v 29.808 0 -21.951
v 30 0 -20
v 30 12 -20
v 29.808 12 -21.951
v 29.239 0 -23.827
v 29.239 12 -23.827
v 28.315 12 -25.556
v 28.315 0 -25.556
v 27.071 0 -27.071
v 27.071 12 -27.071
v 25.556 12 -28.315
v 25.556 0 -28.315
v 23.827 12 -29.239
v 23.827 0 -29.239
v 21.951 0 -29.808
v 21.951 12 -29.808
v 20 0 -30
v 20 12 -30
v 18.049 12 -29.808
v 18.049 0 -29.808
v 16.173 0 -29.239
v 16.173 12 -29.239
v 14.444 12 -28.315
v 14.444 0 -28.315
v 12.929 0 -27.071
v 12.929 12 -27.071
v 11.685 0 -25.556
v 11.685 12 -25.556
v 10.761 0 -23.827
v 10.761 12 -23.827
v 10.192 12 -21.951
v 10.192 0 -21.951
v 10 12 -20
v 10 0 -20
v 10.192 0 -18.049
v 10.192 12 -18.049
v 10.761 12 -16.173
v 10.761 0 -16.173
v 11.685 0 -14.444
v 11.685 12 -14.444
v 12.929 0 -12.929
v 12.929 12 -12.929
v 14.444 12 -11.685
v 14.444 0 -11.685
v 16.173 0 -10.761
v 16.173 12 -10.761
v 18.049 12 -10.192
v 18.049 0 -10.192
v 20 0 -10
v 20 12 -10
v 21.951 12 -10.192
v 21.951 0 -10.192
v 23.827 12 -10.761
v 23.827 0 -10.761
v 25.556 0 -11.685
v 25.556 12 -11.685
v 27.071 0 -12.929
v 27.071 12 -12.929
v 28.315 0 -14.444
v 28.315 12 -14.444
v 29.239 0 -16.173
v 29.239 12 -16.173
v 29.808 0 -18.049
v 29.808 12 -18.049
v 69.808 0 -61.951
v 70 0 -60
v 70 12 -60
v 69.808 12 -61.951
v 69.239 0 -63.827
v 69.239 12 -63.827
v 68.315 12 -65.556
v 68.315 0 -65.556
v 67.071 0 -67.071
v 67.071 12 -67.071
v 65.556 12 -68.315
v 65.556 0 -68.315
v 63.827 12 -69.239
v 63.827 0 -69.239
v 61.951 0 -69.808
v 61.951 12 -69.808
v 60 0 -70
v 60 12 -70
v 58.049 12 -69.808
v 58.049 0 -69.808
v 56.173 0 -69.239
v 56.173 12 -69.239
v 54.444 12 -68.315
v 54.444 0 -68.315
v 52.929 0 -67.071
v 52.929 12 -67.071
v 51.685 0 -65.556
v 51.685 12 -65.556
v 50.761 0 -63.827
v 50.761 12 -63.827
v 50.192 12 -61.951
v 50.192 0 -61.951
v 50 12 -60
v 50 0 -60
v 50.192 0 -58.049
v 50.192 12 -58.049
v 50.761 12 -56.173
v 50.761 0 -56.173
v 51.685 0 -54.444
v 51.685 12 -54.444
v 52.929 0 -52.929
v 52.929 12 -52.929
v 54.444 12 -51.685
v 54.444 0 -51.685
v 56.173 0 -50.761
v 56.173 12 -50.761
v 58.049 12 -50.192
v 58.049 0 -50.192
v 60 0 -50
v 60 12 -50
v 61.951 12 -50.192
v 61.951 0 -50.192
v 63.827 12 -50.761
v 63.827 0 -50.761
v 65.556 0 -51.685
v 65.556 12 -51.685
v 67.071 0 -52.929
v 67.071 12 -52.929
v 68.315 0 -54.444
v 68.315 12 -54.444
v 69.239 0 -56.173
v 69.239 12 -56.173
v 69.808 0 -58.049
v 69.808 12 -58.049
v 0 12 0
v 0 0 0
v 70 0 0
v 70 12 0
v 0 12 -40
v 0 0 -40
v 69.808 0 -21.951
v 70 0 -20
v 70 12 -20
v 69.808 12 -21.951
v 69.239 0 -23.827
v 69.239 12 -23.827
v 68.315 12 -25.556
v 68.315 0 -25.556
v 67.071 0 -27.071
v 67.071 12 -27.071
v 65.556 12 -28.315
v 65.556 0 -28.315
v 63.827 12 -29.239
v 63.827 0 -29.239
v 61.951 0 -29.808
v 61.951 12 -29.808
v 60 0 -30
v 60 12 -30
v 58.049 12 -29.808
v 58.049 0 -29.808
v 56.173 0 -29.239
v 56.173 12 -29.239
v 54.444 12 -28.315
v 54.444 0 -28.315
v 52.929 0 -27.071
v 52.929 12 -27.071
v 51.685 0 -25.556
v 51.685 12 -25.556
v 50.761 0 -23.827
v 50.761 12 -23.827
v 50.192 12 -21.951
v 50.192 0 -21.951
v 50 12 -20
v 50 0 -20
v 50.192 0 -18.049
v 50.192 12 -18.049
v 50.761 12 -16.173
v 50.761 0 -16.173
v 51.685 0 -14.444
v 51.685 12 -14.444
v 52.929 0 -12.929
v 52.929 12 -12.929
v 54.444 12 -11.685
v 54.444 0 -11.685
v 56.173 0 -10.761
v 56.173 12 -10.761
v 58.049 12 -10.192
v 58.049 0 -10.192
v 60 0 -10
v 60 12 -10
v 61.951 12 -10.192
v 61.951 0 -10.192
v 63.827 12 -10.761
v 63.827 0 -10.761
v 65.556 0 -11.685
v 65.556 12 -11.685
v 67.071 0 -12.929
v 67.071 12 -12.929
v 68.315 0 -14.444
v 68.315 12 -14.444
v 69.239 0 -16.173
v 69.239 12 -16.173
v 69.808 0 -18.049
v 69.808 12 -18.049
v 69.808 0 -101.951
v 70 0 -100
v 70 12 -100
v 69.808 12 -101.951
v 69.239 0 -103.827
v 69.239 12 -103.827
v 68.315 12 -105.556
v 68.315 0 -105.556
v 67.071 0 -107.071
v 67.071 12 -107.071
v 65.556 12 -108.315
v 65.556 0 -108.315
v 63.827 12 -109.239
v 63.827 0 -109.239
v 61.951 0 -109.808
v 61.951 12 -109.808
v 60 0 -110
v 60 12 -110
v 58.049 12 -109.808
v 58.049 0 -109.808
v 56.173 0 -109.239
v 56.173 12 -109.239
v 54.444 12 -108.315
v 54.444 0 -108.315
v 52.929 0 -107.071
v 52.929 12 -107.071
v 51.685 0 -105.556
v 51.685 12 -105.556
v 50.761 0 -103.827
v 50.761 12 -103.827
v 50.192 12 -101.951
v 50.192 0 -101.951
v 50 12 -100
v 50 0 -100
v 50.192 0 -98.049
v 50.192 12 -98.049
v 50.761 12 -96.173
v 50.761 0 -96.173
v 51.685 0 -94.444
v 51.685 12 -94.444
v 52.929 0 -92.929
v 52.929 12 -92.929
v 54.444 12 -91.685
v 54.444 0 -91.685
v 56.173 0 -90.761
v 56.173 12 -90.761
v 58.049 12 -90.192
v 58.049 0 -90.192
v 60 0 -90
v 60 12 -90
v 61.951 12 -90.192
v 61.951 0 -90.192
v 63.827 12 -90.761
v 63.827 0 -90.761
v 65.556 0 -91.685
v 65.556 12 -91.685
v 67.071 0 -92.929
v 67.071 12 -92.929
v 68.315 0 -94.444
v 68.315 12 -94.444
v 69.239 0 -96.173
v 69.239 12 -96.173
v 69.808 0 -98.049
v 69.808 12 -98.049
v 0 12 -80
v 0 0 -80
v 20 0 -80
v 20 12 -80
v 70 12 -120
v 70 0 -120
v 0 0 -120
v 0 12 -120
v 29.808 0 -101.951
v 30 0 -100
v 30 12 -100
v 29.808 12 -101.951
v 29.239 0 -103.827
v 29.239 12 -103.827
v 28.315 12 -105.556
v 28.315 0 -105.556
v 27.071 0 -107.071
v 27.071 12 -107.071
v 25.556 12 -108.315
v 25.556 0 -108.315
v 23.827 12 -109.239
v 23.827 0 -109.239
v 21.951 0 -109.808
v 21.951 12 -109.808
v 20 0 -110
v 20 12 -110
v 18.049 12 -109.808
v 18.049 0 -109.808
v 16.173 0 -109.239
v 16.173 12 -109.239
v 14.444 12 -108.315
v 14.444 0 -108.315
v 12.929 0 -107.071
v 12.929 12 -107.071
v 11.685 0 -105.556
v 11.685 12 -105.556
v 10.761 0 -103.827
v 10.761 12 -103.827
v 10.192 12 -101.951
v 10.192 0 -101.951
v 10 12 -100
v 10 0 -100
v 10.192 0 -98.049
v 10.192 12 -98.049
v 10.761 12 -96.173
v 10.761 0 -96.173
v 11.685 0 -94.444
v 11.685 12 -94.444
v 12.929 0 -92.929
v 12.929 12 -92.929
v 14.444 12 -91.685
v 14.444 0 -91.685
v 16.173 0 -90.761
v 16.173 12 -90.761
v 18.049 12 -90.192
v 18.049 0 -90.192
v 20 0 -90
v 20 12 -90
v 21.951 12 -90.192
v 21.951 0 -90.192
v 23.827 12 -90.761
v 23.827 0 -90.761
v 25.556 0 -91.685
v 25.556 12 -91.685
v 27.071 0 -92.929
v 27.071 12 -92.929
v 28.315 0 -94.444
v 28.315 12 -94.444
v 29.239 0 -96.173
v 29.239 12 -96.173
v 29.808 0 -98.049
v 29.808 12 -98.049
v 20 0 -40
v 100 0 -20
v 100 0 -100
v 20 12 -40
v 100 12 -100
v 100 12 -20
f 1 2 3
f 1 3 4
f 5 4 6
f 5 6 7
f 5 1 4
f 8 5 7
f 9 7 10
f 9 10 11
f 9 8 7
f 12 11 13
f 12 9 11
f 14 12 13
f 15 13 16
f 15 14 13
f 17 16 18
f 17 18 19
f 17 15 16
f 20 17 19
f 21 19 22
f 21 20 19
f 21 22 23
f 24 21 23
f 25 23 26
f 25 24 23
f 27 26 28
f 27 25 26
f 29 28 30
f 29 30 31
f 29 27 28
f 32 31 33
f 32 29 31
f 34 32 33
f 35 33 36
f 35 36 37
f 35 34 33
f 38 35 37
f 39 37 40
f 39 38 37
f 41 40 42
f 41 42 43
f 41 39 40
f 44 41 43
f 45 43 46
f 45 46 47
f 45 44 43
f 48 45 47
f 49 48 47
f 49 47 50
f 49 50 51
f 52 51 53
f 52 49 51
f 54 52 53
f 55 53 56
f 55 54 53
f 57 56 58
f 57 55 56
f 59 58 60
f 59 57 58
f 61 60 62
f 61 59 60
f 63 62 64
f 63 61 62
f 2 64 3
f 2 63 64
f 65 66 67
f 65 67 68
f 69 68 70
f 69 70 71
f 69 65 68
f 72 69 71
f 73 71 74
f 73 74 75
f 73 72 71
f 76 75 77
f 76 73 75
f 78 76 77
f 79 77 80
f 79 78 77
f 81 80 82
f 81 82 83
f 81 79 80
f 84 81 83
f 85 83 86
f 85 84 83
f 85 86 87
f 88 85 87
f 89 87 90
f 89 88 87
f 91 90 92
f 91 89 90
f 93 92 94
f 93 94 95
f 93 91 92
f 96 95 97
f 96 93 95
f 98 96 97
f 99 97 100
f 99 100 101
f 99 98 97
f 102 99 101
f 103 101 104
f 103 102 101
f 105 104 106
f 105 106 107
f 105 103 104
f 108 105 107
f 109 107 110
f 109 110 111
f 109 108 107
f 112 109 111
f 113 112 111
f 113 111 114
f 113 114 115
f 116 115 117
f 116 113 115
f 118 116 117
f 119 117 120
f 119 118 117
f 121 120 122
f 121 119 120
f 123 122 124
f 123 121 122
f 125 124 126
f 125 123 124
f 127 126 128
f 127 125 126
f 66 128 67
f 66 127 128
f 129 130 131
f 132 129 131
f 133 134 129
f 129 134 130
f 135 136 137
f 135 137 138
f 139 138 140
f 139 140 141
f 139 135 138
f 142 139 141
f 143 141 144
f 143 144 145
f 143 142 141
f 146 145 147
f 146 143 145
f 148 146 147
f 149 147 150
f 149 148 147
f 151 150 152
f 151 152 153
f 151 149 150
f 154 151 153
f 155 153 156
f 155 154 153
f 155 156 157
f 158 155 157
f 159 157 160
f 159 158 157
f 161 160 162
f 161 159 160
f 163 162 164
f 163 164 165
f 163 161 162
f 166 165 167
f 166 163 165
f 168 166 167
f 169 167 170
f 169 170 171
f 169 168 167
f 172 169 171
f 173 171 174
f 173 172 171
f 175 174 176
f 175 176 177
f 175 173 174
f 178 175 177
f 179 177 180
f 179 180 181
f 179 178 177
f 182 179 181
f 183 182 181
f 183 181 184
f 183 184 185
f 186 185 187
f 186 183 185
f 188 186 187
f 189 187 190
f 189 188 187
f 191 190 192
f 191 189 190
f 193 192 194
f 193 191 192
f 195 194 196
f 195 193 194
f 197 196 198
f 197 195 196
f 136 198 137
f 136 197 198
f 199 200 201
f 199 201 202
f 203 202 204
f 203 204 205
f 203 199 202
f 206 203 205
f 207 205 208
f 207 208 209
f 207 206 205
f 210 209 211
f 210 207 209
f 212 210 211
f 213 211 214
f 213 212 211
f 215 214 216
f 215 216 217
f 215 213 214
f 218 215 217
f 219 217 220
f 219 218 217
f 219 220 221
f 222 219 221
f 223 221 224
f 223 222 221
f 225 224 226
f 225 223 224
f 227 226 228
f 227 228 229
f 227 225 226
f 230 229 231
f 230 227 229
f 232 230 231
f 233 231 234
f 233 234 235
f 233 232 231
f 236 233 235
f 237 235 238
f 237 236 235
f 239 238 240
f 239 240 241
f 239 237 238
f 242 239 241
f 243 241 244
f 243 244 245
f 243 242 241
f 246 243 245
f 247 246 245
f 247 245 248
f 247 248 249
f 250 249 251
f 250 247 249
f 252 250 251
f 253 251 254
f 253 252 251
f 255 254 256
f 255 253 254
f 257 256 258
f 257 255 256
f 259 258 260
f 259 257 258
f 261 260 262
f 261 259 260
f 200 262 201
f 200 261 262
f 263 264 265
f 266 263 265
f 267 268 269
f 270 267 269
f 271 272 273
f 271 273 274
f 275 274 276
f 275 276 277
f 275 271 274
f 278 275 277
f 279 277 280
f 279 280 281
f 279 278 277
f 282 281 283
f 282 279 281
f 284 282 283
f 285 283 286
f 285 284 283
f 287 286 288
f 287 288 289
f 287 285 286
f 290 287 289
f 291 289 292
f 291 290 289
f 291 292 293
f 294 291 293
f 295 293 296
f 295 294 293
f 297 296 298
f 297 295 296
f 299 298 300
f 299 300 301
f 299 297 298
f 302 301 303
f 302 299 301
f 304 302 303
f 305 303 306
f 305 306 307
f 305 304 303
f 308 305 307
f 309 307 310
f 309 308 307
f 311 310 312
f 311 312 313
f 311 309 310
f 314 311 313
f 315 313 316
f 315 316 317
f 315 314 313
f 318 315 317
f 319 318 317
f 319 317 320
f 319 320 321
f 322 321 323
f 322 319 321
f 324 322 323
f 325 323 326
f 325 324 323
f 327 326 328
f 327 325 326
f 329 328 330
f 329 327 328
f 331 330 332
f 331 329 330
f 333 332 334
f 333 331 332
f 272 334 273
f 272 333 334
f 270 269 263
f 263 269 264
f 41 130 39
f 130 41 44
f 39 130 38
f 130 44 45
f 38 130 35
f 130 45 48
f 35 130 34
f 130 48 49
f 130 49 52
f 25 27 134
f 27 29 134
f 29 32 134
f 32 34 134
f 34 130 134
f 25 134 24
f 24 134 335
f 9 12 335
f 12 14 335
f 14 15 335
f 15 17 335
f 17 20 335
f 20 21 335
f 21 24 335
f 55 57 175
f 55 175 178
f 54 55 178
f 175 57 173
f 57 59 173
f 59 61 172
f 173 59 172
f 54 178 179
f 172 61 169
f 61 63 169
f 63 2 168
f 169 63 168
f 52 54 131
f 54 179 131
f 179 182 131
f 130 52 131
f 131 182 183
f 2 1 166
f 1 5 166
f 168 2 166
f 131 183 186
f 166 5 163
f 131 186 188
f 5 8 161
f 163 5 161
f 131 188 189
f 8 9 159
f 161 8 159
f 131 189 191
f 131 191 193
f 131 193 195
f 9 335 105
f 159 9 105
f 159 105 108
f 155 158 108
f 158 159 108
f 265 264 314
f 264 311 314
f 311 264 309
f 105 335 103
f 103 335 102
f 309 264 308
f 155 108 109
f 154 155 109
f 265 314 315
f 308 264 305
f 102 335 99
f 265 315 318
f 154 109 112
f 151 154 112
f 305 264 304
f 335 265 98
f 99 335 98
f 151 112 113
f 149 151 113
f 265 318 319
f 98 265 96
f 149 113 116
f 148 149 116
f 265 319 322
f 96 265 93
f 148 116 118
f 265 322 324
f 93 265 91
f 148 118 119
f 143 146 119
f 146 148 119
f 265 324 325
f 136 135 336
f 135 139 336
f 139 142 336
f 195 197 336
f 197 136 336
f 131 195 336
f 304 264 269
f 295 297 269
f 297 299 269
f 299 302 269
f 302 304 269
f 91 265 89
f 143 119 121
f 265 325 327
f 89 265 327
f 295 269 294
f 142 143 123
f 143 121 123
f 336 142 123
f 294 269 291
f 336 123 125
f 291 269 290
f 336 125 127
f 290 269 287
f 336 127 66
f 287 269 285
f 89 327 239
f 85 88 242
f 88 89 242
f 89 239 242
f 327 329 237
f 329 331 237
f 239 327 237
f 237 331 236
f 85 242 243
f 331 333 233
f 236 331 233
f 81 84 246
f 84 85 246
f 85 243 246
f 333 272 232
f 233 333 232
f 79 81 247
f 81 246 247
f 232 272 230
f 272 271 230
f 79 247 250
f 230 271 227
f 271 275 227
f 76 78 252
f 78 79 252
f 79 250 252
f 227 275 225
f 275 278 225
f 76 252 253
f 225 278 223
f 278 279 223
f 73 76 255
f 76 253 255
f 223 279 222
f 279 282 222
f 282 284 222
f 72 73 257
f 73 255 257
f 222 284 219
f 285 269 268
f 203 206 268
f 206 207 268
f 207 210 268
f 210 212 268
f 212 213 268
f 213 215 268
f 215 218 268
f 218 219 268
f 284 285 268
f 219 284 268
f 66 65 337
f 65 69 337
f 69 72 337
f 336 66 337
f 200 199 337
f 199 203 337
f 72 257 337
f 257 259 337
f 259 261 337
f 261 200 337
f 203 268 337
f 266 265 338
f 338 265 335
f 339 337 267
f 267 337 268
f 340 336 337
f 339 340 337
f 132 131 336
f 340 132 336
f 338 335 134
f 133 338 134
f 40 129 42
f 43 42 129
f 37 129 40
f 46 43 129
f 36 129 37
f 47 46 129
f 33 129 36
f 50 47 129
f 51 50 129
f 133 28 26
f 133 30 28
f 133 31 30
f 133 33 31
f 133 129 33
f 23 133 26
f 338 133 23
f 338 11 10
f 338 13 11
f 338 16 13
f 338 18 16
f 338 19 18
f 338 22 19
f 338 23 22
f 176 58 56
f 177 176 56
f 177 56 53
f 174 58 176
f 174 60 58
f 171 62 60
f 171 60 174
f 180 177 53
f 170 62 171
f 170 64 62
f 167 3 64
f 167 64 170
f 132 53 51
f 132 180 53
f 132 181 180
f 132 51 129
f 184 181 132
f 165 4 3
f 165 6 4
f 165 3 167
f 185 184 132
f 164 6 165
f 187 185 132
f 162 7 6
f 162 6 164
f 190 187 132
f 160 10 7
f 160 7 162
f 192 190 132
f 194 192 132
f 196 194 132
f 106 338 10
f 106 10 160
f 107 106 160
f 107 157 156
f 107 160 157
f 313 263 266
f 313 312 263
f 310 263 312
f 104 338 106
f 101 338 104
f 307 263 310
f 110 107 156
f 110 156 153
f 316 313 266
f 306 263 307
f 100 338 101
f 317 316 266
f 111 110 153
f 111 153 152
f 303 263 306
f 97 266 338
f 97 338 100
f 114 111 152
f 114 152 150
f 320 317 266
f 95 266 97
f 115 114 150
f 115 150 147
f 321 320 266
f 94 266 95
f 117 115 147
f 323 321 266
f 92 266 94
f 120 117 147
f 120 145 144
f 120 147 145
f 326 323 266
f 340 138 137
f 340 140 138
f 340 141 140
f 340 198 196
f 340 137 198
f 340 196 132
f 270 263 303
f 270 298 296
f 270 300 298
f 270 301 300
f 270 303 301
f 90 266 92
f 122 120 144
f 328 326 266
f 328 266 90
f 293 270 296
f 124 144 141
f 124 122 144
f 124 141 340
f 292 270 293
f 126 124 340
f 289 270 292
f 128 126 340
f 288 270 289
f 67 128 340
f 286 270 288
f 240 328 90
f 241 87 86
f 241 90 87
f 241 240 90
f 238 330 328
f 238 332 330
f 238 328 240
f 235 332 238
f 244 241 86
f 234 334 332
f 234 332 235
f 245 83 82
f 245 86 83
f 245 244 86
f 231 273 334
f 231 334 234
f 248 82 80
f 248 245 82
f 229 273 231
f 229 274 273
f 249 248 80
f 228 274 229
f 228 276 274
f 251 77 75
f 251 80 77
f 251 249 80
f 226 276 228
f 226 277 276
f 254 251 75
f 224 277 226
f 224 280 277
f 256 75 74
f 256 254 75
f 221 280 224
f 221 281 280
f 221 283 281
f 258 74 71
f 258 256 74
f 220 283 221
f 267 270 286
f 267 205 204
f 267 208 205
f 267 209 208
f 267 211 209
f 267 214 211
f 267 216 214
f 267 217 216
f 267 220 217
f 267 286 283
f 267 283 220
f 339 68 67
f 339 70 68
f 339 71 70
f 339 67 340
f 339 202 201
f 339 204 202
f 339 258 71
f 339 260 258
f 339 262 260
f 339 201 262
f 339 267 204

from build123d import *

# Parameters (mm, degrees)
SKETCH2_R           = 10
BOSS_EXTRUDE1_DEPTH = 12


with BuildPart() as part:
    # Sketch2 → Boss-Extrude1 (new body)
    with BuildSketch(Plane(origin=(0, 0, 0), x_dir=(1, 0, 0), z_dir=(0, 1, 0))):
        Polygon((0, 0), (70, 0), (100, 20), (100, 100), (70, 120), (0, 120), (0, 80), (20, 80), (20, 40), (0, 40), align=None)
        with Locations((20, 100)):
            Circle(SKETCH2_R, mode=Mode.SUBTRACT)
        with Locations((60, 100)):
            Circle(SKETCH2_R, mode=Mode.SUBTRACT)
        with Locations((60, 20)):
            Circle(SKETCH2_R, mode=Mode.SUBTRACT)
        with Locations((20, 20)):
            Circle(SKETCH2_R, mode=Mode.SUBTRACT)
        with Locations((60, 60)):
            Circle(SKETCH2_R, mode=Mode.SUBTRACT)
    extrude(amount=BOSS_EXTRUDE1_DEPTH)


solid = part.part
